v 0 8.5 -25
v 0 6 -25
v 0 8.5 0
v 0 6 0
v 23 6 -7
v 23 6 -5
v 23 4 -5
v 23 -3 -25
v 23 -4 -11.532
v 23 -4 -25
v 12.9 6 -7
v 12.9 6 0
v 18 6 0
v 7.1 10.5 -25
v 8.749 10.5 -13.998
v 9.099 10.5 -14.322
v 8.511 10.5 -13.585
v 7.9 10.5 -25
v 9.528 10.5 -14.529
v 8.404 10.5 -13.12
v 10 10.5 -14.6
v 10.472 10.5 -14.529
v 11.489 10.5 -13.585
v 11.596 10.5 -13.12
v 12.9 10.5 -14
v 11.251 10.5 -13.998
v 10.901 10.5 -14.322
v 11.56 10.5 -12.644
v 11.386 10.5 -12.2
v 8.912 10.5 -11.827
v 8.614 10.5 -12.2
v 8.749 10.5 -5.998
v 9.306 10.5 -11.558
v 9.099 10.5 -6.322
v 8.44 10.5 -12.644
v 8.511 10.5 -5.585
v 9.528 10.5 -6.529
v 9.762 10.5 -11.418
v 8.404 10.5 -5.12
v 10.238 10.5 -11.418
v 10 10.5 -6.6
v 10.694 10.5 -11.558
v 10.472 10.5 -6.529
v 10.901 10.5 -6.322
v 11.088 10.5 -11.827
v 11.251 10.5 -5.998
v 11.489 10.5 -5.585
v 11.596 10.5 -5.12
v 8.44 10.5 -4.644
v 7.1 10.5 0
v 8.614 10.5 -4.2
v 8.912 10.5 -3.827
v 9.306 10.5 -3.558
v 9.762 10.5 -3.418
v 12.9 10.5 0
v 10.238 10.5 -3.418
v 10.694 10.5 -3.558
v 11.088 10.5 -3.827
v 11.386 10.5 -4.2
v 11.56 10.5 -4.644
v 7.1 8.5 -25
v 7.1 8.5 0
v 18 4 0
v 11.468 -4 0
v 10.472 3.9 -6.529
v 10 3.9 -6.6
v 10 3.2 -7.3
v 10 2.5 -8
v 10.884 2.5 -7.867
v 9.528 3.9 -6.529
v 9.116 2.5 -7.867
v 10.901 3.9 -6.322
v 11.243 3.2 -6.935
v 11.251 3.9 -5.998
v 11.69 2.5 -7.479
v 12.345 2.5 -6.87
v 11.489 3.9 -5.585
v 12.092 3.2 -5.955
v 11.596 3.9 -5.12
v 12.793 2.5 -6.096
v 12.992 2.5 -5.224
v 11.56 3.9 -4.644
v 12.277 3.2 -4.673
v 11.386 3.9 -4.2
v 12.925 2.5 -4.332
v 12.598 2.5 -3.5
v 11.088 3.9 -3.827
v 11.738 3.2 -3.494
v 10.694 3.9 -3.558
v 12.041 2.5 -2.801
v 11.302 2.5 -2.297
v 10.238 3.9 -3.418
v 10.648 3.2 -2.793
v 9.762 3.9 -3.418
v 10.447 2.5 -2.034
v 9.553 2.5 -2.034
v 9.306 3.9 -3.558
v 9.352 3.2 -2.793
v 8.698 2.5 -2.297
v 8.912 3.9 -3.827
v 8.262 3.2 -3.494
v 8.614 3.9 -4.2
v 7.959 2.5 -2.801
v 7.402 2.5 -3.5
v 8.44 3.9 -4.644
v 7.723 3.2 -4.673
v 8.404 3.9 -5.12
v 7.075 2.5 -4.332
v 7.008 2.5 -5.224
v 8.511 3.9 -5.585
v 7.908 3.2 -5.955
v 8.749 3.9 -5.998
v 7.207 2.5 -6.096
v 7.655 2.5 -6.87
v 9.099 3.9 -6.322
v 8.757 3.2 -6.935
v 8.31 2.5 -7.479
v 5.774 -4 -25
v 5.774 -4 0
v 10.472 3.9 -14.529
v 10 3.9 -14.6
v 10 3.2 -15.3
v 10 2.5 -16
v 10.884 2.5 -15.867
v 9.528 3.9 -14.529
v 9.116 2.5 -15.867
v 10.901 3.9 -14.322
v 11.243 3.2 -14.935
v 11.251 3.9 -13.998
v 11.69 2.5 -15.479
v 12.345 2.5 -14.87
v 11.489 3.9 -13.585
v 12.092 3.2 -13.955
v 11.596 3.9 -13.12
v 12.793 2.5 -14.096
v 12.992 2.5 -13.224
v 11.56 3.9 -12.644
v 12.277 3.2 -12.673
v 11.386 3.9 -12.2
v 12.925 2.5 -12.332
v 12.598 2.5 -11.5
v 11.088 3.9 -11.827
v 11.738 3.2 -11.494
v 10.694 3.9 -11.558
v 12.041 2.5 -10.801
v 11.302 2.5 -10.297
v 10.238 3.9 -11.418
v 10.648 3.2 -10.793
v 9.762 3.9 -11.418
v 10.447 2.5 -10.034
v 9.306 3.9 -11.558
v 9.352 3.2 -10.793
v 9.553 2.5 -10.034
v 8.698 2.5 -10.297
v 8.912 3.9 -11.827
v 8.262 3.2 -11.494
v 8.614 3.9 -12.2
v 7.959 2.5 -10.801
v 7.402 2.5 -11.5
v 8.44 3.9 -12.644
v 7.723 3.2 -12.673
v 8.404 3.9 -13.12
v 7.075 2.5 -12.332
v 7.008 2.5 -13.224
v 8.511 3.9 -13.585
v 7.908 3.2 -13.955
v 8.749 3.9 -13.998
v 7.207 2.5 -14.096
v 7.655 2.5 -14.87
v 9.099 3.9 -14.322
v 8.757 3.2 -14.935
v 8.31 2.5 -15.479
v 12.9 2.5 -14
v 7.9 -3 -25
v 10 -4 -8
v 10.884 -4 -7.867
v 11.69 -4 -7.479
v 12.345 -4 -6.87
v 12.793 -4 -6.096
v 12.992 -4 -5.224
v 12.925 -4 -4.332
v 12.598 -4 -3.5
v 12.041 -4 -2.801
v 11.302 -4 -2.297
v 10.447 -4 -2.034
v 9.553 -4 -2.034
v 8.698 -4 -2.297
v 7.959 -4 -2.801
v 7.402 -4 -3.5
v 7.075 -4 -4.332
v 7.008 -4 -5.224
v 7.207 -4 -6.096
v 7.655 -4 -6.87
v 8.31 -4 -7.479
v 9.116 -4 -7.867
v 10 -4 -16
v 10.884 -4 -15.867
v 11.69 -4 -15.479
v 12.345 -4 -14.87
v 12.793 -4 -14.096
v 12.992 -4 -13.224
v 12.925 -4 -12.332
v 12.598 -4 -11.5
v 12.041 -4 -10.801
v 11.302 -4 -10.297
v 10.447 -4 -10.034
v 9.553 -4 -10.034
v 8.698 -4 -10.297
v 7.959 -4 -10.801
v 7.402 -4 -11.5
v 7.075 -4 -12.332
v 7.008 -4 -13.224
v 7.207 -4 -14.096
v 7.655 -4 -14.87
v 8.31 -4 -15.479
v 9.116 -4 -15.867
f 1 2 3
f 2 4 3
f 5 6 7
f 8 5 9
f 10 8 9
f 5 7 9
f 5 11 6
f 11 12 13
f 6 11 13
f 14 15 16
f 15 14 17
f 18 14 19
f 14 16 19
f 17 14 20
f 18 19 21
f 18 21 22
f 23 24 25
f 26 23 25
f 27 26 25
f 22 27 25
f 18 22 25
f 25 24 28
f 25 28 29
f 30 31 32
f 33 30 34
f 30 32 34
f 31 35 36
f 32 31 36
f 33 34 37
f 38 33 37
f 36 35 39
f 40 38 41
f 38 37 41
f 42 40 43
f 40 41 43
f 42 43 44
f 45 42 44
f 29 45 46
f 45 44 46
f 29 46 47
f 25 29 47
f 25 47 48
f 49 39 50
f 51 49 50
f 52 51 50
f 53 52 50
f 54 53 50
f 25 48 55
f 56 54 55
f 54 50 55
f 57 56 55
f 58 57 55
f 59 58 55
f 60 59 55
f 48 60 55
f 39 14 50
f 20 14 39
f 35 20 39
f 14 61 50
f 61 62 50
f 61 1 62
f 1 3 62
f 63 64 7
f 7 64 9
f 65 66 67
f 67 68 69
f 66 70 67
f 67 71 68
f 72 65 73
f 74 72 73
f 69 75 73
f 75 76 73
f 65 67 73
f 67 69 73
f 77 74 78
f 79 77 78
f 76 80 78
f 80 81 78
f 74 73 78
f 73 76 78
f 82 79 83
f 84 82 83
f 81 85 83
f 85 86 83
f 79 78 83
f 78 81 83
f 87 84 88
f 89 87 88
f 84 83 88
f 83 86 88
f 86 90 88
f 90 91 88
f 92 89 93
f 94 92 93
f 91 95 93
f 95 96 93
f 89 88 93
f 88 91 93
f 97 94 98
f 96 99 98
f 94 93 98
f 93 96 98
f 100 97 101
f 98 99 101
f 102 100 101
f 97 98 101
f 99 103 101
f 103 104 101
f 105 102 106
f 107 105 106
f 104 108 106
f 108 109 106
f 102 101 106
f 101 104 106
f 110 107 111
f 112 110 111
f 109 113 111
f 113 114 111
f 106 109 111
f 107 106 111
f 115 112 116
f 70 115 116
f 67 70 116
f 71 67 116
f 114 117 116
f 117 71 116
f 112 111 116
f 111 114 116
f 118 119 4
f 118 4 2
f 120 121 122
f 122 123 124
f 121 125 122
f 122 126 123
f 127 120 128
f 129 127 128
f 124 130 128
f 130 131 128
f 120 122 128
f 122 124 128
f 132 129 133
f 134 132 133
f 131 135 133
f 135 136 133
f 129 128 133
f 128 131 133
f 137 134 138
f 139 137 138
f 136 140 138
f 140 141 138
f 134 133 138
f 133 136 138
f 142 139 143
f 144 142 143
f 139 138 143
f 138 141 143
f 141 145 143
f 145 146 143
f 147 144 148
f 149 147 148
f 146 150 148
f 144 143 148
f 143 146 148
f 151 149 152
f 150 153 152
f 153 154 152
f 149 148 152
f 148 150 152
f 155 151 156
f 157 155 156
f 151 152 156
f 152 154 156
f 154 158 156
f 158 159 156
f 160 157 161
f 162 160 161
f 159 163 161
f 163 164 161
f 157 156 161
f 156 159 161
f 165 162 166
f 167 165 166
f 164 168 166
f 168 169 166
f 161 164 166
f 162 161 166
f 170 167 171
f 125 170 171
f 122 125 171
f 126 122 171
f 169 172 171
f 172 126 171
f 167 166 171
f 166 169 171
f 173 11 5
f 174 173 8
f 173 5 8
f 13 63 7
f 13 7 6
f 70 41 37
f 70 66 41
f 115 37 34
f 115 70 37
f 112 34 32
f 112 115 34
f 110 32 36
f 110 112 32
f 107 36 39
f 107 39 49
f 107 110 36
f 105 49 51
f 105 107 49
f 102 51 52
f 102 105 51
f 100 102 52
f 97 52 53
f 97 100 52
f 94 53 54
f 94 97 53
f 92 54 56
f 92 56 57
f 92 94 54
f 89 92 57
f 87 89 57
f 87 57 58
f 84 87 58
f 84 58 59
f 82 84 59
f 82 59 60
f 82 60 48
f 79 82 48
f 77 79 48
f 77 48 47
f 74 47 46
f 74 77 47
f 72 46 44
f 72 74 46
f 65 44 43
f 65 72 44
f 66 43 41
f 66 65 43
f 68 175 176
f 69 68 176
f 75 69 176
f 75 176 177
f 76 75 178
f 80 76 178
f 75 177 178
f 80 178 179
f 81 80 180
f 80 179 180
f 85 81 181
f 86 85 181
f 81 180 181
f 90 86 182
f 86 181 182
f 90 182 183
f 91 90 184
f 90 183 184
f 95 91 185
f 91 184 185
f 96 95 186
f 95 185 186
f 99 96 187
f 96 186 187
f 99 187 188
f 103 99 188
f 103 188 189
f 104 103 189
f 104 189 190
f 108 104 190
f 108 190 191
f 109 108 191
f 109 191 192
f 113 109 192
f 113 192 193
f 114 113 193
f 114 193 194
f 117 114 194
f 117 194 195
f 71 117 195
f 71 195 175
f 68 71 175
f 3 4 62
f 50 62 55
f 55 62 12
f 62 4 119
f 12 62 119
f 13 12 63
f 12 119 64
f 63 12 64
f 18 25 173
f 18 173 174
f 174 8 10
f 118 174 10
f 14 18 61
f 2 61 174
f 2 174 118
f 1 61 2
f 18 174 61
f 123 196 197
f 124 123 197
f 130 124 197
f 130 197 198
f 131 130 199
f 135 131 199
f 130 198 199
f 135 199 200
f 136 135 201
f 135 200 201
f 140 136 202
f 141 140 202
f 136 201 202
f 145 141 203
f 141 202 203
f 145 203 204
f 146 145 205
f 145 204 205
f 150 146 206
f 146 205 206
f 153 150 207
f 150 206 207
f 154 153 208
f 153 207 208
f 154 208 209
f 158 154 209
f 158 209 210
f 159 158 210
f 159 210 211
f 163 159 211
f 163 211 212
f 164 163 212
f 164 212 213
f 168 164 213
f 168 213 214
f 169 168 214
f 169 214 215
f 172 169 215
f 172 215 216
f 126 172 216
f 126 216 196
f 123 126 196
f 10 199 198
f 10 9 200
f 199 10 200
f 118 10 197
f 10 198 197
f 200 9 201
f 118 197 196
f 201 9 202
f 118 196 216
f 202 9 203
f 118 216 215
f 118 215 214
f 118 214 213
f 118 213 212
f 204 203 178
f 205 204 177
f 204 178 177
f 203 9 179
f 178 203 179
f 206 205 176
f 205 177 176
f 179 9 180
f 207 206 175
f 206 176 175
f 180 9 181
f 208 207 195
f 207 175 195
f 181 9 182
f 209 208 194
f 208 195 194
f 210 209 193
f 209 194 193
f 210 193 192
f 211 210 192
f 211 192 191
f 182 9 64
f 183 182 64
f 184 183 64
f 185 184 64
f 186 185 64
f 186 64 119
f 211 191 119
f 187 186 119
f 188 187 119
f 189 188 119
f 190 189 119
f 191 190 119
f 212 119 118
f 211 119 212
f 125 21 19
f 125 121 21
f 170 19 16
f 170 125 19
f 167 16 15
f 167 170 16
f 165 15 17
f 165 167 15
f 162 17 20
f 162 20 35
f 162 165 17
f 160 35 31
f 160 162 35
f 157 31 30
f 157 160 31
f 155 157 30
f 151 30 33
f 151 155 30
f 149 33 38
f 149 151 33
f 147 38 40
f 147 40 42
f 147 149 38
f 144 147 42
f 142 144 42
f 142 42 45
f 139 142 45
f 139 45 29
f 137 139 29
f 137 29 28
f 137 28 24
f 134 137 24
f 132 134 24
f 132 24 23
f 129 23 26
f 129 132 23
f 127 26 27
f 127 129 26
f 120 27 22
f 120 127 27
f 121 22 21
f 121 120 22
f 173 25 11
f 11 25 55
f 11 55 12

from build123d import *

# Parameters (mm, degrees)
SKETCH_1_W           = 20
SKETCH_1_H           = 20
EXTRUDE_1_DEPTH      = 4
SKETCH_2_W           = 12.9
SKETCH_2_H           = 20
EXTRUDE_2_DEPTH      = 4.5
SKETCH_3_R           = 1.6
CUT_EXTRUDE_1_DEPTH  = 30.533878851
SKETCH_4_W           = 5.8
SKETCH_4_H           = 20
SKETCH_4_R           = 1.6
EXTRUDE_3_DEPTH      = 2
SKETCH_5_R           = 3
CUT_EXTRUDE_3_DEPTH  = 2.4
SKETCH_6_W           = 20
SKETCH_6_H           = 4
EXTRUDE_4_DEPTH      = 3
EXTRUDE_START        = 4
SKETCH_7_W           = 23
SKETCH_7_H           = 20
SKETCH_7_R           = 3
EXTRUDE_5_DEPTH      = 4
SKETCH_9_W           = 10.1
SKETCH_9_H           = 20
EXTRUDE_6_DEPTH      = 2
EXTRUDE_7_DEPTH      = 5
CHAMFER_7_SIZE       = 10
CHAMFER_7_SIZE2      = 5.773502692
CHAMFER_8_SIZE       = 5
CHAMFER_9_SIZE       = 8
CHAMFER_9_SIZE2      = 4.618802154
CUT_EXTRUDE_9_DEPTH  = 10.1
CUT_EXTRUDE_10_REACH = 38.936
CHAMFER_10_SIZE      = 1.5


with BuildPart() as part:
    # 草图1 → 凸台-拉伸1 (new body)
    with BuildSketch(Plane(origin=(0, 0, 0), x_dir=(1, 0, 0), z_dir=(0, 1, 0))):
        with Locations((10, 10)):
            Rectangle(SKETCH_1_W, SKETCH_1_H)
    extrude(amount=EXTRUDE_1_DEPTH)

    # 草图2 → 凸台-拉伸2 (add)
    with BuildSketch(Plane(origin=(0, 4, 0), x_dir=(1, 0, 0), z_dir=(0, 1, 0))):
        with Locations((6.45, 10)):
            Rectangle(SKETCH_2_W, SKETCH_2_H)
    extrude(amount=EXTRUDE_2_DEPTH)

    # 草图3 → 切除-拉伸1 (cut, through all)
    with BuildSketch(Plane(origin=(0, 0, 0), x_dir=(-1, 0, 0), z_dir=(0, -1, 0))):
        with Locations(Location((-10, 5, 0), (0, 0, 90))):
            Circle(SKETCH_3_R)
        with Locations(Location((-10, 13, 0), (0, 0, 90))):
            Circle(SKETCH_3_R)
    extrude(amount=-CUT_EXTRUDE_1_DEPTH, mode=Mode.SUBTRACT)

    # 草图4 → 凸台-拉伸3 (add)
    with BuildSketch(Plane(origin=(0, 8.5, 0), x_dir=(1, 0, 0), z_dir=(0, 1, 0))):
        with Locations((10, 10)):
            Rectangle(SKETCH_4_W, SKETCH_4_H)
        with Locations(Location((10, 13, 0), (0, 0, 90))):
            Circle(SKETCH_4_R, mode=Mode.SUBTRACT)
        with Locations(Location((10, 5, 0), (0, 0, 90))):
            Circle(SKETCH_4_R, mode=Mode.SUBTRACT)
    extrude(amount=EXTRUDE_3_DEPTH)

    # 草图5 → 切除-拉伸3 (cut)
    with BuildSketch(Plane(origin=(0, 0, 0), x_dir=(-1, 0, 0), z_dir=(0, -1, 0))):
        with Locations(Location((-10, 5, 0), (0, 0, 90))):
            Circle(SKETCH_5_R)
        with Locations(Location((-10, 13, 0), (0, 0, 90))):
            Circle(SKETCH_5_R)
    extrude(amount=-CUT_EXTRUDE_3_DEPTH, mode=Mode.SUBTRACT)

    # 草图6 → 凸台-拉伸4 (add)
    with BuildSketch(Plane(origin=(20, 0, 0), x_dir=(0, 0, -1), z_dir=(1, 0, 0))):
        with Locations((10, 2)):
            Rectangle(SKETCH_6_W, SKETCH_6_H)
    extrude(amount=EXTRUDE_4_DEPTH)

    # 草图7 → 凸台-拉伸5 (add)
    with BuildSketch(Plane(origin=(0, 0, 0), x_dir=(-1, 0, 0), z_dir=(0, -1, 0)).offset(EXTRUDE_START)):
        with Locations((-11.5, 10)):
            Rectangle(SKETCH_7_W, SKETCH_7_H)
        with Locations(Location((-10, 13, 0), (0, 0, 90))):
            Circle(SKETCH_7_R, mode=Mode.SUBTRACT)
        with Locations(Location((-10, 5, 0), (0, 0, 90))):
            Circle(SKETCH_7_R, mode=Mode.SUBTRACT)
    extrude(amount=-EXTRUDE_5_DEPTH)

    # 草图9 → 凸台-拉伸6 (add)
    with BuildSketch(Plane(origin=(0, 4, 0), x_dir=(1, 0, 0), z_dir=(0, 1, 0))):
        with Locations((17.95, 10)):
            Rectangle(SKETCH_9_W, SKETCH_9_H)
    extrude(amount=EXTRUDE_6_DEPTH)

    # 草图11 → 凸台-拉伸7 (add)
    with BuildSketch(Plane(origin=(0, 0, -20), x_dir=(-1, 0, 0), z_dir=(0, 0, -1))):
        Polygon((-23, 6), (-23, -4), (0, -4), (0, 8.5), (-7.1, 8.5), (-7.1, 10.5), (-12.9, 10.5), (-12.9, 6), align=None)
    extrude(amount=EXTRUDE_7_DEPTH)

    # 倒角7
    chamfer_7_edges = [part.edges().sort_by_distance(p)[0] for p in [
        (0, -4, -12.5),
    ]]
    chamfer_7_side = [part.faces().sort_by_distance(p)[0] for p in [
        (0, 2.25, -12.5),
    ]]
    chamfer(chamfer_7_edges, length=CHAMFER_7_SIZE, length2=CHAMFER_7_SIZE2, reference=chamfer_7_side[0])

    # 倒角8
    chamfer_8_edges = [part.edges().sort_by_distance(p)[0] for p in [
        (23, 1, 0),
    ]]
    chamfer(chamfer_8_edges, length=CHAMFER_8_SIZE)

    # 倒角9
    chamfer_9_edges = [part.edges().sort_by_distance(p)[0] for p in [
        (20.5, -4, -2.5),
    ]]
    chamfer_9_side = [part.faces().sort_by_distance(p)[0] for p in [
        (20.5, 1, -2.5),
    ]]
    chamfer(chamfer_9_edges, length=CHAMFER_9_SIZE, length2=CHAMFER_9_SIZE2, reference=chamfer_9_side[0])

    # 草图15 → 切除-拉伸9 (cut)
    with BuildSketch(Plane(origin=(23, 0, 0), x_dir=(0, 0, -1), z_dir=(1, 0, 0))):
        Polygon((25, -3), (25, 6), (7, 6), align=None)
    extrude(amount=-CUT_EXTRUDE_9_DEPTH, mode=Mode.SUBTRACT)

    # 切除-拉伸10: up to this plane
    cut_extrude_10_end = Plane(origin=(-7.224611797, 6, -7), z_dir=(0, -0.894427190999916, 0.447213595499958))
    # 草图16 → 切除-拉伸10 (cut, up to the surface)
    with BuildSketch(Plane(origin=(0, 10.5, 0), x_dir=(1, 0, 0), z_dir=(0, 1, 0)), mode=Mode.PRIVATE) as cut_extrude_10_sk1:
        Polygon((7.9, 25), (12.9, 25), (12.9, 14), align=None)
    cut_extrude_10_tool1 = split(extrude(cut_extrude_10_sk1.sketch, amount=-CUT_EXTRUDE_10_REACH, mode=Mode.PRIVATE), bisect_by=cut_extrude_10_end, keep=Keep.BOTH, mode=Mode.PRIVATE)
    add(cut_extrude_10_tool1.solids().sort_by_distance((11.233333, 10.5, -21.333333))[0], mode=Mode.SUBTRACT)

    # 倒角10
    # the kernel refuses this chamfer: 1.5 mm, written as the material it takes off along each edge
    with BuildSketch(Plane(origin=(10, 2.4, -13), x_dir=(0, 0, -1), z_dir=(-1, 0, 0))) as chamfer_10_piece_1_section:
        Polygon((1.6, -CHAMFER_10_SIZE), (1.6 + CHAMFER_10_SIZE, 0), (1.6, 0), align=None)
    chamfer_10_piece_1 = revolve(axis=Axis((10, 2.4, -13), (0, -1, 0)), mode=Mode.PRIVATE)
    chamfer_10_piece_1 = chamfer_10_piece_1 & Plane(origin=(10, 3.20338318, -13), x_dir=(0, 0, -1), z_dir=(0, -1, 0)) * Cylinder(3, 13, mode=Mode.PRIVATE)
    add(chamfer_10_piece_1, mode=Mode.SUBTRACT)
    with BuildSketch(Plane(origin=(10, 2.4, -5), x_dir=(0, 0, -1), z_dir=(-1, 0, 0))) as chamfer_10_piece_2_section:
        Polygon((1.6, -CHAMFER_10_SIZE), (1.6 + CHAMFER_10_SIZE, 0), (1.6, 0), align=None)
    chamfer_10_piece_2 = revolve(axis=Axis((10, 2.4, -5), (0, -1, 0)), mode=Mode.PRIVATE)
    chamfer_10_piece_2 = chamfer_10_piece_2 & Plane(origin=(10, 3.20338318, -5), x_dir=(0, 0, -1), z_dir=(0, -1, 0)) * Cylinder(3, 13, mode=Mode.PRIVATE)
    add(chamfer_10_piece_2, mode=Mode.SUBTRACT)


solid = part.part
